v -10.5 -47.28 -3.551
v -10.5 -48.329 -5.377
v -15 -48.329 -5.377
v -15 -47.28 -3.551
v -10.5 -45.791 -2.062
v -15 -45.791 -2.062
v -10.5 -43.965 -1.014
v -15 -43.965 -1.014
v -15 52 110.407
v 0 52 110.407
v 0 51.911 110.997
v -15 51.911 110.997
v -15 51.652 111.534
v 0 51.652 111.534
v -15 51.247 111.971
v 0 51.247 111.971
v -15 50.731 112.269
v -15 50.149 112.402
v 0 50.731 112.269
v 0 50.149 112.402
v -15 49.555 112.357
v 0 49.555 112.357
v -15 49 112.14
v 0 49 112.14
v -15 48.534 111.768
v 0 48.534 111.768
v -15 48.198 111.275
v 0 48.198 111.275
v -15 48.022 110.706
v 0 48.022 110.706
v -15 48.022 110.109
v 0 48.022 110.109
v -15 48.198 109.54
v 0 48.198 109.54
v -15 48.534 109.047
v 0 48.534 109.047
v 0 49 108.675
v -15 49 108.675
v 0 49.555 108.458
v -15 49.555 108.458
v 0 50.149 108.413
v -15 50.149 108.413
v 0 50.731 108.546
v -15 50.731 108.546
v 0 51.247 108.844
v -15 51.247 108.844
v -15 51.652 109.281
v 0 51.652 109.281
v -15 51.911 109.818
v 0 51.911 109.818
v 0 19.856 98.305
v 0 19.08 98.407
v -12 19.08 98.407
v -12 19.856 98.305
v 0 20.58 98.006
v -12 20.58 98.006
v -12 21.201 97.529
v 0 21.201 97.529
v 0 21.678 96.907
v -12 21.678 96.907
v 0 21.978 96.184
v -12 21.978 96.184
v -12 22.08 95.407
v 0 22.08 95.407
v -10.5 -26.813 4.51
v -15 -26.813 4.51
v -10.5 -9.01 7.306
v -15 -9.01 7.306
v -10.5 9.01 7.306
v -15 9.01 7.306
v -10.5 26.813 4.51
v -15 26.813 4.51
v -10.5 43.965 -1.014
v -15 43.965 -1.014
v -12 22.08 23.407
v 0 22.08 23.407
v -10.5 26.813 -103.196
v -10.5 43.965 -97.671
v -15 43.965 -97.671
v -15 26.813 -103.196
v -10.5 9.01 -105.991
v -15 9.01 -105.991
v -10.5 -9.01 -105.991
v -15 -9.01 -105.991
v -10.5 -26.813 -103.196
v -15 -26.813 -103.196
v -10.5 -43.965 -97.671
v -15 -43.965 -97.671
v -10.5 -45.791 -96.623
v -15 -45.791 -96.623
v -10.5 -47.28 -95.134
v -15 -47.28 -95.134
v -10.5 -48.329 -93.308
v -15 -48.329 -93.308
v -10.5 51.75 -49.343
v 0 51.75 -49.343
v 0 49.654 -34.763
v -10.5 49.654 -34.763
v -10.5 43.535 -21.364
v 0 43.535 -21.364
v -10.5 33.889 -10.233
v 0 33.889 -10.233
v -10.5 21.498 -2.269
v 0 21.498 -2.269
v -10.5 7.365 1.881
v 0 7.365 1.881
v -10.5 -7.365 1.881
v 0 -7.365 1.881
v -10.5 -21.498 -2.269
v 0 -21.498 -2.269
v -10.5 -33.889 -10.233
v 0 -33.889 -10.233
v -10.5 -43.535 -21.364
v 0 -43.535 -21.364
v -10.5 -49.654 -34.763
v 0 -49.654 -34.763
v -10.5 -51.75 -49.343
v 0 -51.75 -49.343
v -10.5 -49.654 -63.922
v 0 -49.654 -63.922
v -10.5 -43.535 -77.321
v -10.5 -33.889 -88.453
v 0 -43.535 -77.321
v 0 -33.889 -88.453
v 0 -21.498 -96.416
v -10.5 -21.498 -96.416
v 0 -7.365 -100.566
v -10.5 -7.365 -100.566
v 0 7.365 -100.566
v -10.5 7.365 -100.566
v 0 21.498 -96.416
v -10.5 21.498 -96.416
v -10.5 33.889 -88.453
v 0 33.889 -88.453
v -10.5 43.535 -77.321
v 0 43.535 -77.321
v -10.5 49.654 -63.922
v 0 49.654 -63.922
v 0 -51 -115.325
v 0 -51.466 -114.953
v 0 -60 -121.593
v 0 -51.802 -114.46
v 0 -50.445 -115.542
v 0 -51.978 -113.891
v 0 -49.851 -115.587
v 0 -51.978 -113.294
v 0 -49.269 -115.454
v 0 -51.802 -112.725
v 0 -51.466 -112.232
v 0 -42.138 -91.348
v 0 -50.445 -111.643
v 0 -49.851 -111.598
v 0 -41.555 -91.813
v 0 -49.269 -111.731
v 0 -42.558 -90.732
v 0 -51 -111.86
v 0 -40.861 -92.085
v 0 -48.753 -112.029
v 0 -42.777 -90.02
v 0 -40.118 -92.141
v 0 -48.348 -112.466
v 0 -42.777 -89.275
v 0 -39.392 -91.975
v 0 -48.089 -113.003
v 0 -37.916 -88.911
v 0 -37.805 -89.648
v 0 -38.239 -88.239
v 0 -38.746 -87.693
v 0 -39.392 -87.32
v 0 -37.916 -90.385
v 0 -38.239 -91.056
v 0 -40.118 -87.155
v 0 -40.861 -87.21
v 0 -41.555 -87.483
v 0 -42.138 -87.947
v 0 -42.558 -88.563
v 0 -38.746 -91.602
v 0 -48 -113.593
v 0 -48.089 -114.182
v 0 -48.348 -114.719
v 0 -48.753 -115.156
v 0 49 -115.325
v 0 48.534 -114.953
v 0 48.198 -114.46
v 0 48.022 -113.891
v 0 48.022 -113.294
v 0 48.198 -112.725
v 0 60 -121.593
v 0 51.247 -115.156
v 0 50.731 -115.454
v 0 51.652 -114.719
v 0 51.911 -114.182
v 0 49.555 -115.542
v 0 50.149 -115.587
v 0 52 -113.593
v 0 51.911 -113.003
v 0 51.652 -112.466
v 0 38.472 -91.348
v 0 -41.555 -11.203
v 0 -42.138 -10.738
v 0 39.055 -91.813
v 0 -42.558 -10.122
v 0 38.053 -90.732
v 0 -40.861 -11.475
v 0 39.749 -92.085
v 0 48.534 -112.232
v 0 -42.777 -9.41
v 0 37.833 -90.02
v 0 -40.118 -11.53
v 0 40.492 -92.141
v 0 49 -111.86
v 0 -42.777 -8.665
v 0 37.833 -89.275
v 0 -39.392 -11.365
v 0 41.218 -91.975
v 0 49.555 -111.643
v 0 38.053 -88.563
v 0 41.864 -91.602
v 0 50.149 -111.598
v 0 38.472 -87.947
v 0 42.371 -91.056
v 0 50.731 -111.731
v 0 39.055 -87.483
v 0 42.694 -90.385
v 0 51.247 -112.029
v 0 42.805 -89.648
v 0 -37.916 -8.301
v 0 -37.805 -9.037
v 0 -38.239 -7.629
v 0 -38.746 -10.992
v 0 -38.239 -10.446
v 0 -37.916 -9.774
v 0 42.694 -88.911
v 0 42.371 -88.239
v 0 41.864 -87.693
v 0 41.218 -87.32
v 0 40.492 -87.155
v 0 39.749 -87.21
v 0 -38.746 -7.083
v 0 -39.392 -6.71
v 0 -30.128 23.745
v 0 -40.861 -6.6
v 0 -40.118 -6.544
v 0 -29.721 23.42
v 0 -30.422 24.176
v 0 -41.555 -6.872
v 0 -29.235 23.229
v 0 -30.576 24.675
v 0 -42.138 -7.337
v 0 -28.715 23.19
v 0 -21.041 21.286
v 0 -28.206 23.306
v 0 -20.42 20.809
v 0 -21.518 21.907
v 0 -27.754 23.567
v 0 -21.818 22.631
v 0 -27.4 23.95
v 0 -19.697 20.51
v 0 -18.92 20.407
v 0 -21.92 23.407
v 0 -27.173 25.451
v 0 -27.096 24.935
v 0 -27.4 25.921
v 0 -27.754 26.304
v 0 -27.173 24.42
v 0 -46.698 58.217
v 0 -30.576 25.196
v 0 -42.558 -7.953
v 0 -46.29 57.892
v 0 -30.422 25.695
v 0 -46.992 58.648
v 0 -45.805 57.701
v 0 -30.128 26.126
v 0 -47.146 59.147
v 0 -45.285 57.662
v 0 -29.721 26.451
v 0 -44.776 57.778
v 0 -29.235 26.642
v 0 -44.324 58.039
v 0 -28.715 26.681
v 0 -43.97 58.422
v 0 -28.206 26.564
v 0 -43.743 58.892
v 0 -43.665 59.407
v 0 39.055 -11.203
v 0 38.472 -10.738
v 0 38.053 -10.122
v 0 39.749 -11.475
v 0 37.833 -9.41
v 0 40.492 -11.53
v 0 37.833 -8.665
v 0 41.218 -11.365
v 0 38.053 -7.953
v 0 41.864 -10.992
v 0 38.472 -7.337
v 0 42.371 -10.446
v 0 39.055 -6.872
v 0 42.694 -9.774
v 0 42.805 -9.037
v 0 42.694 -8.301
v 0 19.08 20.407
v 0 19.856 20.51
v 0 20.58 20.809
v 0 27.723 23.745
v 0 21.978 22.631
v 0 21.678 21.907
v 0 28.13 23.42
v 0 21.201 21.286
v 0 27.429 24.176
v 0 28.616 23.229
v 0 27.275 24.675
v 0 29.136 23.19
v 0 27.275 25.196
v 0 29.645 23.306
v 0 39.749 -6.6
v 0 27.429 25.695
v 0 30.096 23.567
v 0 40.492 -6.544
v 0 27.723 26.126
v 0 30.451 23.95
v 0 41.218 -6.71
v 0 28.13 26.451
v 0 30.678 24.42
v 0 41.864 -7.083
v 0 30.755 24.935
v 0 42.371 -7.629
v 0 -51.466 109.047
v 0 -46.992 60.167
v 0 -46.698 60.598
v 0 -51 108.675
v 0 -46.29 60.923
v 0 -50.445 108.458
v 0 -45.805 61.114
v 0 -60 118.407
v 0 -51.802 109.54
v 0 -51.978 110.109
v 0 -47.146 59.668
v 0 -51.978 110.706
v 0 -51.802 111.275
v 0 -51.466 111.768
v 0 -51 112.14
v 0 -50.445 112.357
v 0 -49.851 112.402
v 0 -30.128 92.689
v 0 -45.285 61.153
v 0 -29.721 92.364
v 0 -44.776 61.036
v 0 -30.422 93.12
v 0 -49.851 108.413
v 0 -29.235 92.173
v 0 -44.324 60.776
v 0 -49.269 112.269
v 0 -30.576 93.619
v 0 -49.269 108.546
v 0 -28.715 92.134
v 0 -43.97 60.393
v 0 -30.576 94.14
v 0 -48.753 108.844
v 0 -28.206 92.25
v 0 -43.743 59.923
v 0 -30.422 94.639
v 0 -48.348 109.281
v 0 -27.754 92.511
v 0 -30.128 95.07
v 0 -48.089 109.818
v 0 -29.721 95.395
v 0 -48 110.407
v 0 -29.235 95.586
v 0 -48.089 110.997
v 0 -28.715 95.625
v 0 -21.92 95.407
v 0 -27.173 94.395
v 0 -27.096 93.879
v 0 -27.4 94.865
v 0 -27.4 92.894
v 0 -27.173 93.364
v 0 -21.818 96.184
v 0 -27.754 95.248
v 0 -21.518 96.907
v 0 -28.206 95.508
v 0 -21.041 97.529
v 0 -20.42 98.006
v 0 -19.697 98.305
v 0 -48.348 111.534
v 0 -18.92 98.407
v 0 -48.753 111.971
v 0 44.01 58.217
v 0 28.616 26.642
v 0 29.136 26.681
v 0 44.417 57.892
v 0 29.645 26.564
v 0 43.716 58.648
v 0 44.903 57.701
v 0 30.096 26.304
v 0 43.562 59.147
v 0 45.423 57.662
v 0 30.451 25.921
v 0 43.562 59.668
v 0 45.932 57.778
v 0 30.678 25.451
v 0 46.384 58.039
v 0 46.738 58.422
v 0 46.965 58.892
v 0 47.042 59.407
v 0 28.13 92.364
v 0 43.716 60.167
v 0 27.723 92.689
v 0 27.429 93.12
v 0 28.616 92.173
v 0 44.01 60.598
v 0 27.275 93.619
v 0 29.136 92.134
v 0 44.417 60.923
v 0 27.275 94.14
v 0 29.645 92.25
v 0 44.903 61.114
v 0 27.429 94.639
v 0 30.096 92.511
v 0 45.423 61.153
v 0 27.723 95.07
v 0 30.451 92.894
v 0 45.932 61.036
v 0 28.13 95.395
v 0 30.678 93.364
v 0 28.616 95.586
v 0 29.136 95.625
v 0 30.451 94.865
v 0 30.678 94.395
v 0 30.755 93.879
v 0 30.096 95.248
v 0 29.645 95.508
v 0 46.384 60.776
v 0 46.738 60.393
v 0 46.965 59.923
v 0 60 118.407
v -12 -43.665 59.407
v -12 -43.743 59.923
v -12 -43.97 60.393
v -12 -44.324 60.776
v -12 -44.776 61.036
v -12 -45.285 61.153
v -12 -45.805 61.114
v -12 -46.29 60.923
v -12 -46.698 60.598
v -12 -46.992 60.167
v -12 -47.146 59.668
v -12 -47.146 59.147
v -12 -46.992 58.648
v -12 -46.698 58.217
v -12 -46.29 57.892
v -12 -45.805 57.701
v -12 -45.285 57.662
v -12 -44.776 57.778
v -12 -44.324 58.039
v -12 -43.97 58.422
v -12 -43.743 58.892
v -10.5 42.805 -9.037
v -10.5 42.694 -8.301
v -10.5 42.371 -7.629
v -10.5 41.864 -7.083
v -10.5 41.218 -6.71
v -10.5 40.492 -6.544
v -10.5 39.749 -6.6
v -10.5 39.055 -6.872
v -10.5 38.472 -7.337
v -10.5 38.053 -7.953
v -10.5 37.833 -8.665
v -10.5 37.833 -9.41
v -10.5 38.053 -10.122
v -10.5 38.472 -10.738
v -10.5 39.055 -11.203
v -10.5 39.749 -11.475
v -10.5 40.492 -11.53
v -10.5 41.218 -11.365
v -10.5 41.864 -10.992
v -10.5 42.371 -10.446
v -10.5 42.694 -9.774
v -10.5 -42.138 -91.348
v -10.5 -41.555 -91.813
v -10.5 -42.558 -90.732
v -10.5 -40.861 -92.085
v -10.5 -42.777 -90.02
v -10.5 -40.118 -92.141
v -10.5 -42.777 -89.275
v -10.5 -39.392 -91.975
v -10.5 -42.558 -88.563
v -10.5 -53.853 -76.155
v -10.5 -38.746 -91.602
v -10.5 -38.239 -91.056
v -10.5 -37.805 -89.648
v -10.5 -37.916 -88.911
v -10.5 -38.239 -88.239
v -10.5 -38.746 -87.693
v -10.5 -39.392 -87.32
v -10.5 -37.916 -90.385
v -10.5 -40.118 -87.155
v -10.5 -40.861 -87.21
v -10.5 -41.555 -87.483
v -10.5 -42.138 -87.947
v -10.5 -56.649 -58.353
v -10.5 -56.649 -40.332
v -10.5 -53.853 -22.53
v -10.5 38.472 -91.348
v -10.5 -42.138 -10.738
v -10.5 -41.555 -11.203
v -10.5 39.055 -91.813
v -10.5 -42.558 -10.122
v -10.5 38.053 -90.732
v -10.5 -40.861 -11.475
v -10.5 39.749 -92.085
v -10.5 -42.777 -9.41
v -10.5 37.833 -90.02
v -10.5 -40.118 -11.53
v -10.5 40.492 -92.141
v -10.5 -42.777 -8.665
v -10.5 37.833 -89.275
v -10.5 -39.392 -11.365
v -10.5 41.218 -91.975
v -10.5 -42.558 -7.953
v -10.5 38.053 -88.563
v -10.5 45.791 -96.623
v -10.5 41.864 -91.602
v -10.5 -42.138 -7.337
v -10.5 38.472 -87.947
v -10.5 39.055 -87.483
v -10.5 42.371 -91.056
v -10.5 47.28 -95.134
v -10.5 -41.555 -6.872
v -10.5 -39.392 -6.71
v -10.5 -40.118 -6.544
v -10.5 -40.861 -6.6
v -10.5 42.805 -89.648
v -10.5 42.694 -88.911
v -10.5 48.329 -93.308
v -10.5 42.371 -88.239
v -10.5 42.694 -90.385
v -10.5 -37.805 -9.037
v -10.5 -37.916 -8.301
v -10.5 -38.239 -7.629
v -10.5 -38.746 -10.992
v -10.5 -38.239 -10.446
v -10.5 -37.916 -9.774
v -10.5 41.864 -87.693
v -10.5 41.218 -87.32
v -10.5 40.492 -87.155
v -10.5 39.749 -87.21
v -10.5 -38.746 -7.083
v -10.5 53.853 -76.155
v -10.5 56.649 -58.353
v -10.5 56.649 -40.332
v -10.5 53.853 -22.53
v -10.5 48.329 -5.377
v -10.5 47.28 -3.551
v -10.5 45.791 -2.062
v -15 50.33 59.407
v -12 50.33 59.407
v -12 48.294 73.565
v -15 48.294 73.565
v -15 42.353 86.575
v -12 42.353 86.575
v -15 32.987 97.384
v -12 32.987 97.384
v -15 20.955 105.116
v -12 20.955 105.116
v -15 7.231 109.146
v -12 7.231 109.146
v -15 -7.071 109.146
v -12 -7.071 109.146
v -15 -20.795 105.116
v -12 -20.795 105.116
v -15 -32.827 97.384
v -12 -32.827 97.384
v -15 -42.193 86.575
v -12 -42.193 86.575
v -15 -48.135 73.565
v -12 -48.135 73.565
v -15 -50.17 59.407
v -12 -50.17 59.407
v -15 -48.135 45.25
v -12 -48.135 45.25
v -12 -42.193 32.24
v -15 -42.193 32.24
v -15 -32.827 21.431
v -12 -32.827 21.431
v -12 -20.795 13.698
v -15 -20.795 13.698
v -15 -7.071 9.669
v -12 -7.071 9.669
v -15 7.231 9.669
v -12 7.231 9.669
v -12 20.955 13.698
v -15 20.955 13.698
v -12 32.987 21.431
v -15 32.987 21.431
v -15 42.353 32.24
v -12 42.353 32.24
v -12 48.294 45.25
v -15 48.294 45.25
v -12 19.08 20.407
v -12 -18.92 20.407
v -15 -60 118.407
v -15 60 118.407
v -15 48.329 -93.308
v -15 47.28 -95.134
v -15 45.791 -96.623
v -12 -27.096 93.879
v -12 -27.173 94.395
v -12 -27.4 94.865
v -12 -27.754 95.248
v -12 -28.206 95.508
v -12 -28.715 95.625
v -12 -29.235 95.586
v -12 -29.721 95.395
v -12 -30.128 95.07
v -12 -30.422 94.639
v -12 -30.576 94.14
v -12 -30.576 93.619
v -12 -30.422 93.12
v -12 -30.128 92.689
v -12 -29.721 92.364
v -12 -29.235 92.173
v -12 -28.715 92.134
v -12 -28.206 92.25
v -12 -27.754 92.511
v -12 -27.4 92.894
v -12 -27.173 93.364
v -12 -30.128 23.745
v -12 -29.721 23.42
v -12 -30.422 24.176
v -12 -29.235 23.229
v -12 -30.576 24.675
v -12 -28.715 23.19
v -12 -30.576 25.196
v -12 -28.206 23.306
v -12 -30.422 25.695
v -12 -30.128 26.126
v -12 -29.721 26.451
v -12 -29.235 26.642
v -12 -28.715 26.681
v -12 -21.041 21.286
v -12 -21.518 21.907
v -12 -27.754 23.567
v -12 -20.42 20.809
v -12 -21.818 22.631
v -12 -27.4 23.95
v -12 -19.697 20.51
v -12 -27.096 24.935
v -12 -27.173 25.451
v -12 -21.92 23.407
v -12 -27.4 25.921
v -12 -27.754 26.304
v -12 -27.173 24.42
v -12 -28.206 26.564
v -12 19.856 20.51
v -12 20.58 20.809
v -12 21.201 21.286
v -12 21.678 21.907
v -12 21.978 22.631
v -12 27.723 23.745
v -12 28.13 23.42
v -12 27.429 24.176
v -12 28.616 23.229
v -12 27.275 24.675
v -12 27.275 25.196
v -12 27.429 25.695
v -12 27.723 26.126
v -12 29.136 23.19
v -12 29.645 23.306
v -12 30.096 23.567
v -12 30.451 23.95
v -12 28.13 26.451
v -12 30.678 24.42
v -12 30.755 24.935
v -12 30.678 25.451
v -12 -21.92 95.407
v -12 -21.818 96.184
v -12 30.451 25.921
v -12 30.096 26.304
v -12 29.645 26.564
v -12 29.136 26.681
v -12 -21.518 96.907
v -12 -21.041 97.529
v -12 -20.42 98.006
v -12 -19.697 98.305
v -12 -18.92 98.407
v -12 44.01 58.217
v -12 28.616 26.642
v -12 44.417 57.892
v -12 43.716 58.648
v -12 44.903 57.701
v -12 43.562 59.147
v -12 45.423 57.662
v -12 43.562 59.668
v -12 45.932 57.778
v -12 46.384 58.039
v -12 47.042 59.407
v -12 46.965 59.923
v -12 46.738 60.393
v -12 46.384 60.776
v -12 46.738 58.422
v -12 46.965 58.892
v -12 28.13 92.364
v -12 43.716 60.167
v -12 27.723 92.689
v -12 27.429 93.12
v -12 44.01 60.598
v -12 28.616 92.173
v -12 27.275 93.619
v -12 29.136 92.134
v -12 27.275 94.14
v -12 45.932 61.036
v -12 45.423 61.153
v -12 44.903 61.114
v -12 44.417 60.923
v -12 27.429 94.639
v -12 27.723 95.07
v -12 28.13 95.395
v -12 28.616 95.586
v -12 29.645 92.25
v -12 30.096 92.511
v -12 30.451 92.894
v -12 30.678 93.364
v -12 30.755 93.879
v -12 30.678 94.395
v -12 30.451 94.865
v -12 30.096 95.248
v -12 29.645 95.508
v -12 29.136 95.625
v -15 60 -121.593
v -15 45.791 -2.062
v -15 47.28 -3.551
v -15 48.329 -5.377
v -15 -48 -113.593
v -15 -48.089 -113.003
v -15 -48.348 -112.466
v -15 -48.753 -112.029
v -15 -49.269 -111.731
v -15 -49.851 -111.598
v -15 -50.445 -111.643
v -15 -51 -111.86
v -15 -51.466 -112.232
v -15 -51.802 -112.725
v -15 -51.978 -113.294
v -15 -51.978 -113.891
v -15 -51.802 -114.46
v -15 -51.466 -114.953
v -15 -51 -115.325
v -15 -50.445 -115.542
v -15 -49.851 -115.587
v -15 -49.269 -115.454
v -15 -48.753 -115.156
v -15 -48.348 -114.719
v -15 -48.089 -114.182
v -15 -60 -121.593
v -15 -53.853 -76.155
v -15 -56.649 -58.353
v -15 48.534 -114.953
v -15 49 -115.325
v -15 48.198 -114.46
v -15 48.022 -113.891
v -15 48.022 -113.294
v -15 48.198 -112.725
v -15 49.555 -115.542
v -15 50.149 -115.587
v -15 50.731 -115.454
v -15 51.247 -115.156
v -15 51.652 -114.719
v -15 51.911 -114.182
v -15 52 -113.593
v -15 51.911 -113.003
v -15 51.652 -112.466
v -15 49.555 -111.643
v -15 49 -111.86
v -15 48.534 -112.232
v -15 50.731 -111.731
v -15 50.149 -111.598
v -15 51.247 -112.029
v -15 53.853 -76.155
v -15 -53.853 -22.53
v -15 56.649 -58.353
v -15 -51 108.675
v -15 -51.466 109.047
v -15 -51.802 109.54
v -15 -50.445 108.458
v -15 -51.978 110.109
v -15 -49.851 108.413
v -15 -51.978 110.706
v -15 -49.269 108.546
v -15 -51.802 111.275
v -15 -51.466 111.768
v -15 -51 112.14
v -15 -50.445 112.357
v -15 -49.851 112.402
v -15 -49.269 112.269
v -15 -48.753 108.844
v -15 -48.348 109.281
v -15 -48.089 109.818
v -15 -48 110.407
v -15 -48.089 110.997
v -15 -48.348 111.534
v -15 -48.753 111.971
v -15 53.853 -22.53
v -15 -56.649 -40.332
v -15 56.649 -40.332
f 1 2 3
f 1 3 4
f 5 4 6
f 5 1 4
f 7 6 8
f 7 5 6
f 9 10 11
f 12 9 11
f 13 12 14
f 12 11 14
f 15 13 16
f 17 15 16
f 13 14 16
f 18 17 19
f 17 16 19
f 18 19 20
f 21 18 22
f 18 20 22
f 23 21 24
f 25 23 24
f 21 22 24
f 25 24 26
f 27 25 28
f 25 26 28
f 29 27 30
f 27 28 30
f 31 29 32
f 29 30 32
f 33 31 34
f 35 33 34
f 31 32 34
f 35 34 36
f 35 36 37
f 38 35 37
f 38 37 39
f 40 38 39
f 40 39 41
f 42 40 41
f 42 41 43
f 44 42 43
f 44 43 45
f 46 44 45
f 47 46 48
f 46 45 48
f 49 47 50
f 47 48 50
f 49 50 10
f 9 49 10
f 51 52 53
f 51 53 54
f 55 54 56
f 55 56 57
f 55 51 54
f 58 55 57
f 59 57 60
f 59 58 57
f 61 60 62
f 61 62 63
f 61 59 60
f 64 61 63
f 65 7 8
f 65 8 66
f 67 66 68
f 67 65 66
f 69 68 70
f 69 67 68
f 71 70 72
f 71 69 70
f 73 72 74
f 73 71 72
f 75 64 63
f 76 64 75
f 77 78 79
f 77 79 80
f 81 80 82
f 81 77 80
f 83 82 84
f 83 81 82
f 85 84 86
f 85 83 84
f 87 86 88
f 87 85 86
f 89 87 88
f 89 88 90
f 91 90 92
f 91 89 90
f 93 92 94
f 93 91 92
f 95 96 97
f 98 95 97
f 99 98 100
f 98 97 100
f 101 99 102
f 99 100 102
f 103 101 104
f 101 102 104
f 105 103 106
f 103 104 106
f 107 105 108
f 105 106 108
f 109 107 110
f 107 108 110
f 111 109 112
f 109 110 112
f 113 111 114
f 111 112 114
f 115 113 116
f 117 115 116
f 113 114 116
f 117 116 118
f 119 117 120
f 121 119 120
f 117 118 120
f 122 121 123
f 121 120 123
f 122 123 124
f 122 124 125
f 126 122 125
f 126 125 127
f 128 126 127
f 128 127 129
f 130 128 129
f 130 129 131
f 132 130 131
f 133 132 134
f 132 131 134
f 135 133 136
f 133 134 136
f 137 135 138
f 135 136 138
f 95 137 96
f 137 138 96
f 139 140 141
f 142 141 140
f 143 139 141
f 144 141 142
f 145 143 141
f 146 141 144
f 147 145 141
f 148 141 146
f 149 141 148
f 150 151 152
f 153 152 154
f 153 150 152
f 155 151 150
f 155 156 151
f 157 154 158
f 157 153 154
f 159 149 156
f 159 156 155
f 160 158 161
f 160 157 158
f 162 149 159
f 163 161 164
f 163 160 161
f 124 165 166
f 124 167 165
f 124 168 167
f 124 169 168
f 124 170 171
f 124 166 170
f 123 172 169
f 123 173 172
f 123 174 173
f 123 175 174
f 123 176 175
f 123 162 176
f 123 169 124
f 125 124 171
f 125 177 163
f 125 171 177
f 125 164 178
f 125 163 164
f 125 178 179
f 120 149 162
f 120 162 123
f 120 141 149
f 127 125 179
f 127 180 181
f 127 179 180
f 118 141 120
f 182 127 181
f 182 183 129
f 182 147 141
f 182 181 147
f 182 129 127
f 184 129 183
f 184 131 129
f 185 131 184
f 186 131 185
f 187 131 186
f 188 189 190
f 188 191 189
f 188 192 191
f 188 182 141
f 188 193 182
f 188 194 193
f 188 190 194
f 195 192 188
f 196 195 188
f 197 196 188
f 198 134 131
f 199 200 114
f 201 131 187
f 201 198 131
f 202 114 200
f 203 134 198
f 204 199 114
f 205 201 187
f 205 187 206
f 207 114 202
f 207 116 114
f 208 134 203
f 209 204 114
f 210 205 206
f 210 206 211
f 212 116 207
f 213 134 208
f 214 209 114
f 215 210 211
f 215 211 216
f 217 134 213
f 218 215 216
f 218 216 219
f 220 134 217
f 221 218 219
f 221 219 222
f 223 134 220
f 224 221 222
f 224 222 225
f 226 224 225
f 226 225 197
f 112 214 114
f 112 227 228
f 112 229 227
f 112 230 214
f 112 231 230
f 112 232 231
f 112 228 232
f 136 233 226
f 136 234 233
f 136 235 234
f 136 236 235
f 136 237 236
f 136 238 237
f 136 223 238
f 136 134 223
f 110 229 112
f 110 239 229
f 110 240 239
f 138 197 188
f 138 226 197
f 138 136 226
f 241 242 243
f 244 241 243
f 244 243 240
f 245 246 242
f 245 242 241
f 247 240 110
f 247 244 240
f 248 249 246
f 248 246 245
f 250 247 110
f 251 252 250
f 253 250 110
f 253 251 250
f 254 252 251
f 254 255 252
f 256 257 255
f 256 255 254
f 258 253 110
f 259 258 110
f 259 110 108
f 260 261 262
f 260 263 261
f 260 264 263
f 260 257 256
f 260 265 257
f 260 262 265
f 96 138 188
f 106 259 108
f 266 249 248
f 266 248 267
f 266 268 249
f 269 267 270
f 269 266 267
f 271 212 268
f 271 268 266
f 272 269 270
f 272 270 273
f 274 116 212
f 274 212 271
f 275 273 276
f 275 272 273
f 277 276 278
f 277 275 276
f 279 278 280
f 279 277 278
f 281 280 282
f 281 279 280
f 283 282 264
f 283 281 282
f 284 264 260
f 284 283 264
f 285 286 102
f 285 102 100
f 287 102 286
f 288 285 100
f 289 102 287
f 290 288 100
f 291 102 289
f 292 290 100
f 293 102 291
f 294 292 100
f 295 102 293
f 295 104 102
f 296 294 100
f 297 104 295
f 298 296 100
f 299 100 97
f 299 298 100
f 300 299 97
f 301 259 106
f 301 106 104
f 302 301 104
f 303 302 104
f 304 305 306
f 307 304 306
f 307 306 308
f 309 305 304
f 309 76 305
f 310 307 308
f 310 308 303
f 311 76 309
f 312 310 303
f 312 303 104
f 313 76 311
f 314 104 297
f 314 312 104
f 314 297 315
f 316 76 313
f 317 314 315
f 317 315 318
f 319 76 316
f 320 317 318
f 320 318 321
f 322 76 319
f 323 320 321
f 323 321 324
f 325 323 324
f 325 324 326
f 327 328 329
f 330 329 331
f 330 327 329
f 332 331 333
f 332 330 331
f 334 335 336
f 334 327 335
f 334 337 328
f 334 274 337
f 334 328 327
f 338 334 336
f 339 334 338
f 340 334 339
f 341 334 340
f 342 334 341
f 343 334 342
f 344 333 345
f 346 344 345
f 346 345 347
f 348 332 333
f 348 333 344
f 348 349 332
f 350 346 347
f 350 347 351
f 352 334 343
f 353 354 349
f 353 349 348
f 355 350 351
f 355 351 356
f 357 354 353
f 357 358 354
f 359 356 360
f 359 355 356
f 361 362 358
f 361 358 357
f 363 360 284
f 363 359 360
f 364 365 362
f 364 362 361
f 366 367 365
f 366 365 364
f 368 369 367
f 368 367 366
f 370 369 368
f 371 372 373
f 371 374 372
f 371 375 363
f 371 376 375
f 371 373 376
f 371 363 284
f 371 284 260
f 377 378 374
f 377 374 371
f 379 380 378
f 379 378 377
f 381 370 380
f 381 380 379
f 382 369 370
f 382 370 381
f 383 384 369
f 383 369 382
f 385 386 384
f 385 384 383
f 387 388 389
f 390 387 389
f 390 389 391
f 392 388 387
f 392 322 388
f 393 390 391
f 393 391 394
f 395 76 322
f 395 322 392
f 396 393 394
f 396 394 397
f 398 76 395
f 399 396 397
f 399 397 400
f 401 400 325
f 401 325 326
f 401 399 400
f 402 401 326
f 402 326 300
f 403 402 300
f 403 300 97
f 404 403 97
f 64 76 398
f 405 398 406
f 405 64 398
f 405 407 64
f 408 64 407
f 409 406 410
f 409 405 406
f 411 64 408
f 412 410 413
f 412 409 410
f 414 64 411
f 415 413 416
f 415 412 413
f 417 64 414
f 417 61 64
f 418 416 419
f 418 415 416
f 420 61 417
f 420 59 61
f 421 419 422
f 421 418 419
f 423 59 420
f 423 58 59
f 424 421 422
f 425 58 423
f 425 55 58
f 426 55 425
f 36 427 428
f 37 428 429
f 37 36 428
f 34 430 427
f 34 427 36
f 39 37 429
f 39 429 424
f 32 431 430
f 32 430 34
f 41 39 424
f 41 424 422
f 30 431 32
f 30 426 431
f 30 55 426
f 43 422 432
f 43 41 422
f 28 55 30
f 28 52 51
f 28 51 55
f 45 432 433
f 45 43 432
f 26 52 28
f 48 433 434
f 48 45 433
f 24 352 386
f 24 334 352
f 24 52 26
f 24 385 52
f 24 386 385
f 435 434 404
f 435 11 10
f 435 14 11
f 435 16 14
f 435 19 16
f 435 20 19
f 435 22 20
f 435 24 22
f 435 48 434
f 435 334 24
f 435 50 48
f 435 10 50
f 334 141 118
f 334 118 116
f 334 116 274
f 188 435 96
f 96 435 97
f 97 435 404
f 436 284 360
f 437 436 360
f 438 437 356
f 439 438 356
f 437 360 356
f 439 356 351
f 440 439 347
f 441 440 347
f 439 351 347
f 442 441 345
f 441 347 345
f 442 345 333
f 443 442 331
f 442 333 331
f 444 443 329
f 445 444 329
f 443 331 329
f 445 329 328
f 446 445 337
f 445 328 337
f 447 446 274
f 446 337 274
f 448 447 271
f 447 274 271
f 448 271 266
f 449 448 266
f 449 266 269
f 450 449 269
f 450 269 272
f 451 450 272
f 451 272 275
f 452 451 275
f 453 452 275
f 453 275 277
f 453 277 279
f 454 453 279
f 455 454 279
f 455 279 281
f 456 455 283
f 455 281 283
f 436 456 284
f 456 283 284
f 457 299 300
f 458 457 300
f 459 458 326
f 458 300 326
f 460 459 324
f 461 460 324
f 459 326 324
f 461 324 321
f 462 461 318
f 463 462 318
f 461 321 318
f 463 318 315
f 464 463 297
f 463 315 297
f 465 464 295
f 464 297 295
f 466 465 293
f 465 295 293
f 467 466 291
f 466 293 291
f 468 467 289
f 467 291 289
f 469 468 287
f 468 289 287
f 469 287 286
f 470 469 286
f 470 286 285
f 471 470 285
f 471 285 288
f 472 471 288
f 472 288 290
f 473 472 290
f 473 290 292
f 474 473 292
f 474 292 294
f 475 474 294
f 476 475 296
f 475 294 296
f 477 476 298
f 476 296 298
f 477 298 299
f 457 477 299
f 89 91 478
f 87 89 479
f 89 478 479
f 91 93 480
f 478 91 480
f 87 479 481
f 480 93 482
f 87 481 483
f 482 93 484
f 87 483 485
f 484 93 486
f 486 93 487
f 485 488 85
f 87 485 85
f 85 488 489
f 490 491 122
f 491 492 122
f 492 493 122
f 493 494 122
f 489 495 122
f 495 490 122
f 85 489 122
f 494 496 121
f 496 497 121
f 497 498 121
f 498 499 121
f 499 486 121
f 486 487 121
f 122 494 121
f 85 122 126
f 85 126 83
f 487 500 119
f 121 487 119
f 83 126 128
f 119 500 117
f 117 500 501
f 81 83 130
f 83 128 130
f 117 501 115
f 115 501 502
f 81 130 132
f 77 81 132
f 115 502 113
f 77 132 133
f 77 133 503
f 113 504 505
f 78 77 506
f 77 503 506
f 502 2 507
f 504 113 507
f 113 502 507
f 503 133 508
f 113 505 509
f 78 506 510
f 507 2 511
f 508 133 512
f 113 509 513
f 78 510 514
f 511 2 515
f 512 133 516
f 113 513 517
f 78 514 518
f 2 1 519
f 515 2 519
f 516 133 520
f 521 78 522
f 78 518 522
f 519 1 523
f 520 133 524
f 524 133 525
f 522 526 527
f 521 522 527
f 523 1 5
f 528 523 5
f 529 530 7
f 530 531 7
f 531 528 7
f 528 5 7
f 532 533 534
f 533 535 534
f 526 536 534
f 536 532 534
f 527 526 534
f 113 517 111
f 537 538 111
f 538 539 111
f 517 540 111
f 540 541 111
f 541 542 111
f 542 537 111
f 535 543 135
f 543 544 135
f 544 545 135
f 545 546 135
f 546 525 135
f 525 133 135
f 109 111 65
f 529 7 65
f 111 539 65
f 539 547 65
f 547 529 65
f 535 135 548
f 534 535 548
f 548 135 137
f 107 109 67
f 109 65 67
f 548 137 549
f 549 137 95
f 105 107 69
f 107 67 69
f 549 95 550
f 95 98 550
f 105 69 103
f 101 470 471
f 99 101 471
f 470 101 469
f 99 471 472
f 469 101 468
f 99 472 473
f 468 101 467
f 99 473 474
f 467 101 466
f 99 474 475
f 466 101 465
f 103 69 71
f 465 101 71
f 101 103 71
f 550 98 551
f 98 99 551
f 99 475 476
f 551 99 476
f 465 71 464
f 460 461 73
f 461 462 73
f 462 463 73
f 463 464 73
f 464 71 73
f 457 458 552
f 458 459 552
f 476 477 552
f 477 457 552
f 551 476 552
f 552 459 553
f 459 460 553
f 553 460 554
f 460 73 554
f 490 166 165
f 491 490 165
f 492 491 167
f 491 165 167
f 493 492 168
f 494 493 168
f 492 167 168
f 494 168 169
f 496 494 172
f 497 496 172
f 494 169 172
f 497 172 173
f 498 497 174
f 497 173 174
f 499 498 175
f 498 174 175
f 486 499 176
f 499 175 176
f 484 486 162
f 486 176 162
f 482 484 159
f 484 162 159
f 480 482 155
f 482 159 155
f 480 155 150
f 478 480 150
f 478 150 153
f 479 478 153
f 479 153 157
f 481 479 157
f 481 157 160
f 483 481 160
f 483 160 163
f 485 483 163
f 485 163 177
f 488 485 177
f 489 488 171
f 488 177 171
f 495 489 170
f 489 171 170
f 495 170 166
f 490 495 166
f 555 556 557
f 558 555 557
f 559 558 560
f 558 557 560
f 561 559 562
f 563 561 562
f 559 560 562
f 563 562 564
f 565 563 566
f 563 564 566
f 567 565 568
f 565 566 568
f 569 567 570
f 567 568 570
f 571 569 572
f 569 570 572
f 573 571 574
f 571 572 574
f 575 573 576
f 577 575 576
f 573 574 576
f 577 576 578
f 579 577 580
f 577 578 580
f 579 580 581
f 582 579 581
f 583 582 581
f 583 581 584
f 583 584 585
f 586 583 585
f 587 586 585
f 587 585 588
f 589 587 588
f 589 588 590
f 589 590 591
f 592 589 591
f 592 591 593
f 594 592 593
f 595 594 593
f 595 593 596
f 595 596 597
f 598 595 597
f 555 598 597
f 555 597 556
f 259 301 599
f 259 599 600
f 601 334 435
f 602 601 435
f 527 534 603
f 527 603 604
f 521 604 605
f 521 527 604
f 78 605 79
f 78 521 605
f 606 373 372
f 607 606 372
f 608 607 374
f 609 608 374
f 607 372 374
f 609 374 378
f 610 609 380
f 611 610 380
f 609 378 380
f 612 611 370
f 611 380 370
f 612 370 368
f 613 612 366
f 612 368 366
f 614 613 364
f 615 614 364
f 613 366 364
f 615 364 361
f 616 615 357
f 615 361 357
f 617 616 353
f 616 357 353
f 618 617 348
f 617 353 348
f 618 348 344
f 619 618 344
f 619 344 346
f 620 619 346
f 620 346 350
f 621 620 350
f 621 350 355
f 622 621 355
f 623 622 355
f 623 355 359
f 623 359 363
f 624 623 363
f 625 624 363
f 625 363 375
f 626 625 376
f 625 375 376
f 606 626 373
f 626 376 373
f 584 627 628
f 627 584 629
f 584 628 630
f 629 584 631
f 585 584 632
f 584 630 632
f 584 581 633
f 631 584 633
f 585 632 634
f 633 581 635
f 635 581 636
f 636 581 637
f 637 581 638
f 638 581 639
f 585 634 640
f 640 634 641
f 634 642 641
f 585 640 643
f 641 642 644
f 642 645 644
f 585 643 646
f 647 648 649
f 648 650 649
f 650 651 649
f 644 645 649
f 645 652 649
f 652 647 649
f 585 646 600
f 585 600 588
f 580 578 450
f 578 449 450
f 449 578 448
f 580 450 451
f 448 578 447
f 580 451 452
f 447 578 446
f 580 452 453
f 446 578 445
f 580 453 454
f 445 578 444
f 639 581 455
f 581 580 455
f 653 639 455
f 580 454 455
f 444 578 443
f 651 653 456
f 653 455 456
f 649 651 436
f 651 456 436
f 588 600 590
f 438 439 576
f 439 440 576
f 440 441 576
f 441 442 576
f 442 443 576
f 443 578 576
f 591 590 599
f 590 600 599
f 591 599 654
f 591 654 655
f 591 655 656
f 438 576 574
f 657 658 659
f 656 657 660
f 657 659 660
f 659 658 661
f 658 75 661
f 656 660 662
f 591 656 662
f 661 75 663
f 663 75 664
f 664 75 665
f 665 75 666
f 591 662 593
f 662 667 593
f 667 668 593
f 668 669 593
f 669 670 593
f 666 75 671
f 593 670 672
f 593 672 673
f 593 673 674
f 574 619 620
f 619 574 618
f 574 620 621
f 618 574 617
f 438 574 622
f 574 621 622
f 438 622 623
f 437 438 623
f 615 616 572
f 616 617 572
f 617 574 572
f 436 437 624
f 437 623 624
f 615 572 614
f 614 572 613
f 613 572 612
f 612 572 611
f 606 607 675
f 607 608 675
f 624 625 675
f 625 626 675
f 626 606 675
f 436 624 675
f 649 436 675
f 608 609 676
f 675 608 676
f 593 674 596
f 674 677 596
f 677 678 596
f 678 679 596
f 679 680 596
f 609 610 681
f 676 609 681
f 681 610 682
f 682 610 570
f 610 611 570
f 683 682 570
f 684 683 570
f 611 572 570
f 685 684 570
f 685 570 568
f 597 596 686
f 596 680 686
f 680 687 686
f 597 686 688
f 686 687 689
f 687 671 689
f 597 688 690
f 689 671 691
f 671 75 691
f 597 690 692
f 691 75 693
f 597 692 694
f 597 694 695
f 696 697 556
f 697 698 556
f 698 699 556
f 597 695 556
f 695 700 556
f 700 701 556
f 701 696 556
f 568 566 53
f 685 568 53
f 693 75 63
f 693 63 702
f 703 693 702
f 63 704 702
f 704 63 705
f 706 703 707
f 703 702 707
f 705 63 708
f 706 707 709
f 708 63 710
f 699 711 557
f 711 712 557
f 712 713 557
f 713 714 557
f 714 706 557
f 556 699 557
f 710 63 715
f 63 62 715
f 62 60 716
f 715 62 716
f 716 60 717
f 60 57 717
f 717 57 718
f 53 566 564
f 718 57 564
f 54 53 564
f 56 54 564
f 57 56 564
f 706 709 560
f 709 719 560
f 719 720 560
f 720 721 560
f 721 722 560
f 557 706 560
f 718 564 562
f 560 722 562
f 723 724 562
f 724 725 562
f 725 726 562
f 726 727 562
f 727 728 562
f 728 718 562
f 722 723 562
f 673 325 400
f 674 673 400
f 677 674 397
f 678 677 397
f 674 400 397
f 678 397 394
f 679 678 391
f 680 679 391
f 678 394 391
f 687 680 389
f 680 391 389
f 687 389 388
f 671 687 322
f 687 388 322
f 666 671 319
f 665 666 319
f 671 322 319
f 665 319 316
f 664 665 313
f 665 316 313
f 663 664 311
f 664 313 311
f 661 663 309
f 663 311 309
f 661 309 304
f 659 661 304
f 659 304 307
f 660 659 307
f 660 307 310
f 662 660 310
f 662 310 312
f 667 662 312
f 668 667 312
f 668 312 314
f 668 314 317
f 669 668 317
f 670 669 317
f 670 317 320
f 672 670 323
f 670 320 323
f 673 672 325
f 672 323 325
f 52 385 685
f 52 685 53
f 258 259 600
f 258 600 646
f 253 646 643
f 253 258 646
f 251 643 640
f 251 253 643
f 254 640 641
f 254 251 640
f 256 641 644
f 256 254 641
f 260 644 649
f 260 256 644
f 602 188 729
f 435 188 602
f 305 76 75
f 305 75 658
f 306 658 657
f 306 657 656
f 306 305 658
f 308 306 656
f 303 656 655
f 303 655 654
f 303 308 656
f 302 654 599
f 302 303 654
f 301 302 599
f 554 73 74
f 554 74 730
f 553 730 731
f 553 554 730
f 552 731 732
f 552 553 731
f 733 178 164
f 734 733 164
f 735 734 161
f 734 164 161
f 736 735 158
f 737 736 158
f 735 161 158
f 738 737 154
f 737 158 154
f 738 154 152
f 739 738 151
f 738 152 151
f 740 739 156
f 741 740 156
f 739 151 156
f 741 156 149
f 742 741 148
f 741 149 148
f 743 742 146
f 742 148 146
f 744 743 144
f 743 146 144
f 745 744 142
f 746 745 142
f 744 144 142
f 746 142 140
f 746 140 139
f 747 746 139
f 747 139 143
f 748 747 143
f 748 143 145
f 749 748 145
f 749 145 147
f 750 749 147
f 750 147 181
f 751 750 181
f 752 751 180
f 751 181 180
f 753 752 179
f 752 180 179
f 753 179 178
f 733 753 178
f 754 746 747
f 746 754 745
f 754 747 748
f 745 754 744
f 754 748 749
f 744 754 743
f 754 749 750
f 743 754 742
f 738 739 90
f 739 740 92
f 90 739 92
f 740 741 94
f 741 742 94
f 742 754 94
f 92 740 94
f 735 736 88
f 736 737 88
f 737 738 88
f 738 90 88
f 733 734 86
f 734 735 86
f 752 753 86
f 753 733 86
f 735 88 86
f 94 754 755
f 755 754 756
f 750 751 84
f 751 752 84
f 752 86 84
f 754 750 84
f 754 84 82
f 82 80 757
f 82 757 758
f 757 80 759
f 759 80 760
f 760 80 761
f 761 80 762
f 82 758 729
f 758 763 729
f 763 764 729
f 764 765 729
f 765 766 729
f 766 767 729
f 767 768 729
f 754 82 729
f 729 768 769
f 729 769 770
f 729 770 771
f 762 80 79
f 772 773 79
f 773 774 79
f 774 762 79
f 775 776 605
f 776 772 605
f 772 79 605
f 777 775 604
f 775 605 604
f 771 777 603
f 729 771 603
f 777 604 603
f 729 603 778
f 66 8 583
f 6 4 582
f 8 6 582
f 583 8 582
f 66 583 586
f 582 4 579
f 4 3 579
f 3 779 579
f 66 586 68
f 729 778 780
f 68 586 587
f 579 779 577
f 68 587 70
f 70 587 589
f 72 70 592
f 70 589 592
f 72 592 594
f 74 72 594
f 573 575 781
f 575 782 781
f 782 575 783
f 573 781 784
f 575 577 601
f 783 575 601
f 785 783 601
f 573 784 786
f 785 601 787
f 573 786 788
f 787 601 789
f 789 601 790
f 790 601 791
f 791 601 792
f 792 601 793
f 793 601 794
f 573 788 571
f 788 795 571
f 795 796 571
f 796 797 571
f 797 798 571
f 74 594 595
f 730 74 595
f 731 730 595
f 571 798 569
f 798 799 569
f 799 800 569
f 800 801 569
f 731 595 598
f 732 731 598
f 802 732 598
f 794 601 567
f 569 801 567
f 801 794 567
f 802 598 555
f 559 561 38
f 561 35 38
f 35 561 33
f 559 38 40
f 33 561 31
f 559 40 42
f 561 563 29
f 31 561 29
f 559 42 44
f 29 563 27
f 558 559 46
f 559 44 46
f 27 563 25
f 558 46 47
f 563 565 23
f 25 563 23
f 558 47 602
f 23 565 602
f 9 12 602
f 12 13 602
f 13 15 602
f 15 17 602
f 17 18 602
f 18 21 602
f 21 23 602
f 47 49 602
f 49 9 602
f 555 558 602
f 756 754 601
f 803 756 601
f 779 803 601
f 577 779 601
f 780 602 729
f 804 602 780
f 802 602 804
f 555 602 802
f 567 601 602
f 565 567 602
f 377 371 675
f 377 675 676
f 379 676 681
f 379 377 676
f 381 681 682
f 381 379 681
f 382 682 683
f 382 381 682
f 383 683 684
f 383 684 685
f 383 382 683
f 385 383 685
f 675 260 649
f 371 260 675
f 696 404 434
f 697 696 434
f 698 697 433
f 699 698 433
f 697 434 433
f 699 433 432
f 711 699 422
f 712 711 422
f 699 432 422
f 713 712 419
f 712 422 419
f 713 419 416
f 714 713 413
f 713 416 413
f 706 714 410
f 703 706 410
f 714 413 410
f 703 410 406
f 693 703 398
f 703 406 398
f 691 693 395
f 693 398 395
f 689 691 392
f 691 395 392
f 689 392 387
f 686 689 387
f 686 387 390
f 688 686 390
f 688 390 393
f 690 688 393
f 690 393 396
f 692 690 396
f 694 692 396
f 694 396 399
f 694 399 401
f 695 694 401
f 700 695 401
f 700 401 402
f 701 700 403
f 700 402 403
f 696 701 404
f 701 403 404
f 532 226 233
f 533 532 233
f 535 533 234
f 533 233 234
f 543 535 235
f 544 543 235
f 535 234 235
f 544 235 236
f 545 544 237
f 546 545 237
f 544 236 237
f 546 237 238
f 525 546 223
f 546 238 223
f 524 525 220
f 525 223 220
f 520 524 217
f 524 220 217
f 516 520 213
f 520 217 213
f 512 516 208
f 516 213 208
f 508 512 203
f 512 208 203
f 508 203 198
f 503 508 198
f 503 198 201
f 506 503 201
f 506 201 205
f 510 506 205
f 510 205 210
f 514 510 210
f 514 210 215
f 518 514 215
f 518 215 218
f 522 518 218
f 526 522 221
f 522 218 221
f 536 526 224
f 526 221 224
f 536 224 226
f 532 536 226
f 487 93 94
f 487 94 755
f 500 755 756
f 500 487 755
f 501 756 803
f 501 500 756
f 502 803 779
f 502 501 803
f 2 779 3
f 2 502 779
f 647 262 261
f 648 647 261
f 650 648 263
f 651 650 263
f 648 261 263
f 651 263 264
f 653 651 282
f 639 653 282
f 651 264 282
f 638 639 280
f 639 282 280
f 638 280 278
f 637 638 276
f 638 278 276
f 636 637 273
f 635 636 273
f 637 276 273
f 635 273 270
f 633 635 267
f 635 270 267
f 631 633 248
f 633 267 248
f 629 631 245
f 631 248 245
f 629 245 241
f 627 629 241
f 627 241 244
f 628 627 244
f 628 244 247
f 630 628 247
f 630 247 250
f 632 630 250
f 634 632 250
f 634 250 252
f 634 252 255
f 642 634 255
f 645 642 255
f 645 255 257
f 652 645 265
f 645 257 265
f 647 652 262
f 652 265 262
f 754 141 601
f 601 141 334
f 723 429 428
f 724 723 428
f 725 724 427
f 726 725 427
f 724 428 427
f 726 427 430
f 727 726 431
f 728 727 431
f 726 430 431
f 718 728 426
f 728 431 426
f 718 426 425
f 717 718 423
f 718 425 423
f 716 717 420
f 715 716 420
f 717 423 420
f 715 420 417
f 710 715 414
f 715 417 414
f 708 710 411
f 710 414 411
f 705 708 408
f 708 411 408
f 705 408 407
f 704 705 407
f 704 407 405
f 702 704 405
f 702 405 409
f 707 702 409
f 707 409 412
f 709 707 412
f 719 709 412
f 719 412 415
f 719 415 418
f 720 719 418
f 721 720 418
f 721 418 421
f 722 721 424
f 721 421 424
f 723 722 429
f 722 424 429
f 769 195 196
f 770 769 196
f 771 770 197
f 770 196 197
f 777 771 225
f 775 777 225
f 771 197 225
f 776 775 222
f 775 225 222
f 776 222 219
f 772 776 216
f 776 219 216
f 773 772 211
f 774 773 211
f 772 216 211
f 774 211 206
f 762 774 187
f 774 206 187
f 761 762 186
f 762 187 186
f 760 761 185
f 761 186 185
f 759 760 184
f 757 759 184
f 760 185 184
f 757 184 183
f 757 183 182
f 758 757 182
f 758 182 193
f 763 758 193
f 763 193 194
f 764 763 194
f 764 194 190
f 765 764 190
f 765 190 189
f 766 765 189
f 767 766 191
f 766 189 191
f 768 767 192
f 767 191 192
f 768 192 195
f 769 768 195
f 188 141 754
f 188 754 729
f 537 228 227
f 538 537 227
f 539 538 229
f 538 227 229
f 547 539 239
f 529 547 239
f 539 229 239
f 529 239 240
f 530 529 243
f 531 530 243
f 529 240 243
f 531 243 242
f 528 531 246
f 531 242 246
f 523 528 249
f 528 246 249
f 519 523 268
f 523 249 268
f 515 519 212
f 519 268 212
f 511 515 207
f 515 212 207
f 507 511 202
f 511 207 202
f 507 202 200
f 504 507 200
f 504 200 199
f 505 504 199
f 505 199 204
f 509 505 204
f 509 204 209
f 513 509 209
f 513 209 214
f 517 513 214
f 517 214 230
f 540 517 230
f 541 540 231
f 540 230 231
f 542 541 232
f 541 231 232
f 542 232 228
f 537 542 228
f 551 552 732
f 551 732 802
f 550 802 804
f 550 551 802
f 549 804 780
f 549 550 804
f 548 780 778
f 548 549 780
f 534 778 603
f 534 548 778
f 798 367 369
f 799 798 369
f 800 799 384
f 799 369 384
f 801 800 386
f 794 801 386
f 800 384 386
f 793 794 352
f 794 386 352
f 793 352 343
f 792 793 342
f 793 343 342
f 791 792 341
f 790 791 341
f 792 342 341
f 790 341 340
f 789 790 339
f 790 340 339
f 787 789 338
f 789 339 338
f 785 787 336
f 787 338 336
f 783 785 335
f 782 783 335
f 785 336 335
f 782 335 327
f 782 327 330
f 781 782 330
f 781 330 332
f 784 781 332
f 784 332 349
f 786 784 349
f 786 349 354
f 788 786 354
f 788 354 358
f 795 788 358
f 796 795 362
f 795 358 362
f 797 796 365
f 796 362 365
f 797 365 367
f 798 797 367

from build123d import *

# Parameters (mm, degrees)
F0_W     = 120
F0_H     = 240
F0_R     = 2
F0_R_2   = 50.25
F1_DEPTH = 15
F0_R_3   = 1.75
F2_DEPTH = 12
F0_R_4   = 2.5
F0_R_5   = 51.75
F3_DEPTH = 10.5


with BuildPart() as f1:
    # F0 (on Right) → F1 (new body)
    with BuildSketch(Plane.YZ):
        with Locations((0, -1.592548)):
            Rectangle(F0_W, F0_H)
        with Locations((-49.999997, -113.592548)):
            Circle(F0_R, mode=Mode.SUBTRACT)
        with BuildLine():
            ThreePointArc((-43.965421, -1.013646), (0, 7.657452), (43.965421, -1.013646))
            ThreePointArc((43.965421, -1.013646), (46.58482, -2.757728), (48.328902, -5.377127))
            ThreePointArc((48.328902, -5.377127), (57, -49.342548), (48.328902, -93.307969))
            ThreePointArc((48.328902, -93.307969), (46.58482, -95.927368), (43.965421, -97.67145))
            ThreePointArc((43.965421, -97.67145), (0, -106.342548), (-43.965421, -97.67145))
            ThreePointArc((-43.965421, -97.67145), (-46.58482, -95.927368), (-48.328902, -93.307969))
            ThreePointArc((-48.328902, -93.307969), (-57, -49.342548), (-48.328902, -5.377127))
            ThreePointArc((-48.328902, -5.377127), (-46.58482, -2.757728), (-43.965421, -1.013646))
        make_face(mode=Mode.SUBTRACT)
        with Locations((50.000003, -113.592548)):
            Circle(F0_R, mode=Mode.SUBTRACT)
        with Locations((-49.999997, 110.407452)):
            Circle(F0_R, mode=Mode.SUBTRACT)
        with Locations((0.079908, 59.407452)):
            Circle(F0_R_2, mode=Mode.SUBTRACT)
        with Locations((50.000003, 110.407455)):
            Circle(F0_R, mode=Mode.SUBTRACT)
    extrude(amount=-F1_DEPTH)

    # F0 (on Right) → F2 (join)
    with BuildSketch(Plane.YZ):
        with Locations((0.079908, 59.407452)):
            Circle(F0_R_2)
        with Locations((-28.845534, 24.935452)):
            Circle(F0_R_3, mode=Mode.SUBTRACT)
        with Locations((-45.415495, 59.40745)):
            Circle(F0_R_3, mode=Mode.SUBTRACT)
        with Locations((-28.845534, 93.879452)):
            Circle(F0_R_3, mode=Mode.SUBTRACT)
        with Locations((29.005351, 24.935452)):
            Circle(F0_R_3, mode=Mode.SUBTRACT)
        with BuildLine():
            Line((-18.920092, 98.407452), (19.079908, 98.407452))
            ThreePointArc((19.079908, 98.407452), (21.201229, 97.528772), (22.079908, 95.407452))
            Line((22.079908, 95.407452), (22.079908, 23.407452))
            ThreePointArc((22.079908, 23.407452), (21.201229, 21.286132), (19.079908, 20.407452))
            Line((19.079908, 20.407452), (-18.920092, 20.407452))
            ThreePointArc((-18.920092, 20.407452), (-21.041412, 21.286132), (-21.920092, 23.407452))
            Line((-21.920092, 23.407452), (-21.920092, 95.407452))
            ThreePointArc((-21.920092, 95.407452), (-21.041412, 97.528772), (-18.920092, 98.407452))
        make_face(mode=Mode.SUBTRACT)
        with Locations((29.005351, 93.879452)):
            Circle(F0_R_3, mode=Mode.SUBTRACT)
        with Locations((45.292415, 59.40745)):
            Circle(F0_R_3, mode=Mode.SUBTRACT)
    extrude(amount=-F2_DEPTH)

    # F0 (on Right) → F3 (join)
    with BuildSketch(Plane.YZ):
        with BuildLine():
            ThreePointArc((48.328902, -5.377127), (46.58482, -2.757728), (43.965421, -1.013646))
            ThreePointArc((43.965421, -1.013646), (0, 7.657452), (-43.965421, -1.013646))
            ThreePointArc((-43.965421, -1.013646), (-46.58482, -2.757728), (-48.328902, -5.377127))
            ThreePointArc((-48.328902, -5.377127), (-57, -49.342548), (-48.328902, -93.307969))
            ThreePointArc((-48.328902, -93.307969), (-46.58482, -95.927368), (-43.965421, -97.67145))
            ThreePointArc((-43.965421, -97.67145), (0, -106.342548), (43.965421, -97.67145))
            ThreePointArc((43.965421, -97.67145), (46.58482, -95.927368), (48.328902, -93.307969))
            ThreePointArc((48.328902, -93.307969), (57, -49.342548), (48.328902, -5.377127))
        make_face()
        with Locations((-40.305087, -89.647635)):
            Circle(F0_R_4, mode=Mode.SUBTRACT)
        with Locations((-40.305087, -9.037462)):
            Circle(F0_R_4, mode=Mode.SUBTRACT)
        with Locations((40.305087, -89.647635)):
            Circle(F0_R_4, mode=Mode.SUBTRACT)
        with Locations((0, -49.342548)):
            Circle(F0_R_5, mode=Mode.SUBTRACT)
        with Locations((40.305087, -9.037462)):
            Circle(F0_R_4, mode=Mode.SUBTRACT)
    extrude(amount=-F3_DEPTH)


solid = f1.part
